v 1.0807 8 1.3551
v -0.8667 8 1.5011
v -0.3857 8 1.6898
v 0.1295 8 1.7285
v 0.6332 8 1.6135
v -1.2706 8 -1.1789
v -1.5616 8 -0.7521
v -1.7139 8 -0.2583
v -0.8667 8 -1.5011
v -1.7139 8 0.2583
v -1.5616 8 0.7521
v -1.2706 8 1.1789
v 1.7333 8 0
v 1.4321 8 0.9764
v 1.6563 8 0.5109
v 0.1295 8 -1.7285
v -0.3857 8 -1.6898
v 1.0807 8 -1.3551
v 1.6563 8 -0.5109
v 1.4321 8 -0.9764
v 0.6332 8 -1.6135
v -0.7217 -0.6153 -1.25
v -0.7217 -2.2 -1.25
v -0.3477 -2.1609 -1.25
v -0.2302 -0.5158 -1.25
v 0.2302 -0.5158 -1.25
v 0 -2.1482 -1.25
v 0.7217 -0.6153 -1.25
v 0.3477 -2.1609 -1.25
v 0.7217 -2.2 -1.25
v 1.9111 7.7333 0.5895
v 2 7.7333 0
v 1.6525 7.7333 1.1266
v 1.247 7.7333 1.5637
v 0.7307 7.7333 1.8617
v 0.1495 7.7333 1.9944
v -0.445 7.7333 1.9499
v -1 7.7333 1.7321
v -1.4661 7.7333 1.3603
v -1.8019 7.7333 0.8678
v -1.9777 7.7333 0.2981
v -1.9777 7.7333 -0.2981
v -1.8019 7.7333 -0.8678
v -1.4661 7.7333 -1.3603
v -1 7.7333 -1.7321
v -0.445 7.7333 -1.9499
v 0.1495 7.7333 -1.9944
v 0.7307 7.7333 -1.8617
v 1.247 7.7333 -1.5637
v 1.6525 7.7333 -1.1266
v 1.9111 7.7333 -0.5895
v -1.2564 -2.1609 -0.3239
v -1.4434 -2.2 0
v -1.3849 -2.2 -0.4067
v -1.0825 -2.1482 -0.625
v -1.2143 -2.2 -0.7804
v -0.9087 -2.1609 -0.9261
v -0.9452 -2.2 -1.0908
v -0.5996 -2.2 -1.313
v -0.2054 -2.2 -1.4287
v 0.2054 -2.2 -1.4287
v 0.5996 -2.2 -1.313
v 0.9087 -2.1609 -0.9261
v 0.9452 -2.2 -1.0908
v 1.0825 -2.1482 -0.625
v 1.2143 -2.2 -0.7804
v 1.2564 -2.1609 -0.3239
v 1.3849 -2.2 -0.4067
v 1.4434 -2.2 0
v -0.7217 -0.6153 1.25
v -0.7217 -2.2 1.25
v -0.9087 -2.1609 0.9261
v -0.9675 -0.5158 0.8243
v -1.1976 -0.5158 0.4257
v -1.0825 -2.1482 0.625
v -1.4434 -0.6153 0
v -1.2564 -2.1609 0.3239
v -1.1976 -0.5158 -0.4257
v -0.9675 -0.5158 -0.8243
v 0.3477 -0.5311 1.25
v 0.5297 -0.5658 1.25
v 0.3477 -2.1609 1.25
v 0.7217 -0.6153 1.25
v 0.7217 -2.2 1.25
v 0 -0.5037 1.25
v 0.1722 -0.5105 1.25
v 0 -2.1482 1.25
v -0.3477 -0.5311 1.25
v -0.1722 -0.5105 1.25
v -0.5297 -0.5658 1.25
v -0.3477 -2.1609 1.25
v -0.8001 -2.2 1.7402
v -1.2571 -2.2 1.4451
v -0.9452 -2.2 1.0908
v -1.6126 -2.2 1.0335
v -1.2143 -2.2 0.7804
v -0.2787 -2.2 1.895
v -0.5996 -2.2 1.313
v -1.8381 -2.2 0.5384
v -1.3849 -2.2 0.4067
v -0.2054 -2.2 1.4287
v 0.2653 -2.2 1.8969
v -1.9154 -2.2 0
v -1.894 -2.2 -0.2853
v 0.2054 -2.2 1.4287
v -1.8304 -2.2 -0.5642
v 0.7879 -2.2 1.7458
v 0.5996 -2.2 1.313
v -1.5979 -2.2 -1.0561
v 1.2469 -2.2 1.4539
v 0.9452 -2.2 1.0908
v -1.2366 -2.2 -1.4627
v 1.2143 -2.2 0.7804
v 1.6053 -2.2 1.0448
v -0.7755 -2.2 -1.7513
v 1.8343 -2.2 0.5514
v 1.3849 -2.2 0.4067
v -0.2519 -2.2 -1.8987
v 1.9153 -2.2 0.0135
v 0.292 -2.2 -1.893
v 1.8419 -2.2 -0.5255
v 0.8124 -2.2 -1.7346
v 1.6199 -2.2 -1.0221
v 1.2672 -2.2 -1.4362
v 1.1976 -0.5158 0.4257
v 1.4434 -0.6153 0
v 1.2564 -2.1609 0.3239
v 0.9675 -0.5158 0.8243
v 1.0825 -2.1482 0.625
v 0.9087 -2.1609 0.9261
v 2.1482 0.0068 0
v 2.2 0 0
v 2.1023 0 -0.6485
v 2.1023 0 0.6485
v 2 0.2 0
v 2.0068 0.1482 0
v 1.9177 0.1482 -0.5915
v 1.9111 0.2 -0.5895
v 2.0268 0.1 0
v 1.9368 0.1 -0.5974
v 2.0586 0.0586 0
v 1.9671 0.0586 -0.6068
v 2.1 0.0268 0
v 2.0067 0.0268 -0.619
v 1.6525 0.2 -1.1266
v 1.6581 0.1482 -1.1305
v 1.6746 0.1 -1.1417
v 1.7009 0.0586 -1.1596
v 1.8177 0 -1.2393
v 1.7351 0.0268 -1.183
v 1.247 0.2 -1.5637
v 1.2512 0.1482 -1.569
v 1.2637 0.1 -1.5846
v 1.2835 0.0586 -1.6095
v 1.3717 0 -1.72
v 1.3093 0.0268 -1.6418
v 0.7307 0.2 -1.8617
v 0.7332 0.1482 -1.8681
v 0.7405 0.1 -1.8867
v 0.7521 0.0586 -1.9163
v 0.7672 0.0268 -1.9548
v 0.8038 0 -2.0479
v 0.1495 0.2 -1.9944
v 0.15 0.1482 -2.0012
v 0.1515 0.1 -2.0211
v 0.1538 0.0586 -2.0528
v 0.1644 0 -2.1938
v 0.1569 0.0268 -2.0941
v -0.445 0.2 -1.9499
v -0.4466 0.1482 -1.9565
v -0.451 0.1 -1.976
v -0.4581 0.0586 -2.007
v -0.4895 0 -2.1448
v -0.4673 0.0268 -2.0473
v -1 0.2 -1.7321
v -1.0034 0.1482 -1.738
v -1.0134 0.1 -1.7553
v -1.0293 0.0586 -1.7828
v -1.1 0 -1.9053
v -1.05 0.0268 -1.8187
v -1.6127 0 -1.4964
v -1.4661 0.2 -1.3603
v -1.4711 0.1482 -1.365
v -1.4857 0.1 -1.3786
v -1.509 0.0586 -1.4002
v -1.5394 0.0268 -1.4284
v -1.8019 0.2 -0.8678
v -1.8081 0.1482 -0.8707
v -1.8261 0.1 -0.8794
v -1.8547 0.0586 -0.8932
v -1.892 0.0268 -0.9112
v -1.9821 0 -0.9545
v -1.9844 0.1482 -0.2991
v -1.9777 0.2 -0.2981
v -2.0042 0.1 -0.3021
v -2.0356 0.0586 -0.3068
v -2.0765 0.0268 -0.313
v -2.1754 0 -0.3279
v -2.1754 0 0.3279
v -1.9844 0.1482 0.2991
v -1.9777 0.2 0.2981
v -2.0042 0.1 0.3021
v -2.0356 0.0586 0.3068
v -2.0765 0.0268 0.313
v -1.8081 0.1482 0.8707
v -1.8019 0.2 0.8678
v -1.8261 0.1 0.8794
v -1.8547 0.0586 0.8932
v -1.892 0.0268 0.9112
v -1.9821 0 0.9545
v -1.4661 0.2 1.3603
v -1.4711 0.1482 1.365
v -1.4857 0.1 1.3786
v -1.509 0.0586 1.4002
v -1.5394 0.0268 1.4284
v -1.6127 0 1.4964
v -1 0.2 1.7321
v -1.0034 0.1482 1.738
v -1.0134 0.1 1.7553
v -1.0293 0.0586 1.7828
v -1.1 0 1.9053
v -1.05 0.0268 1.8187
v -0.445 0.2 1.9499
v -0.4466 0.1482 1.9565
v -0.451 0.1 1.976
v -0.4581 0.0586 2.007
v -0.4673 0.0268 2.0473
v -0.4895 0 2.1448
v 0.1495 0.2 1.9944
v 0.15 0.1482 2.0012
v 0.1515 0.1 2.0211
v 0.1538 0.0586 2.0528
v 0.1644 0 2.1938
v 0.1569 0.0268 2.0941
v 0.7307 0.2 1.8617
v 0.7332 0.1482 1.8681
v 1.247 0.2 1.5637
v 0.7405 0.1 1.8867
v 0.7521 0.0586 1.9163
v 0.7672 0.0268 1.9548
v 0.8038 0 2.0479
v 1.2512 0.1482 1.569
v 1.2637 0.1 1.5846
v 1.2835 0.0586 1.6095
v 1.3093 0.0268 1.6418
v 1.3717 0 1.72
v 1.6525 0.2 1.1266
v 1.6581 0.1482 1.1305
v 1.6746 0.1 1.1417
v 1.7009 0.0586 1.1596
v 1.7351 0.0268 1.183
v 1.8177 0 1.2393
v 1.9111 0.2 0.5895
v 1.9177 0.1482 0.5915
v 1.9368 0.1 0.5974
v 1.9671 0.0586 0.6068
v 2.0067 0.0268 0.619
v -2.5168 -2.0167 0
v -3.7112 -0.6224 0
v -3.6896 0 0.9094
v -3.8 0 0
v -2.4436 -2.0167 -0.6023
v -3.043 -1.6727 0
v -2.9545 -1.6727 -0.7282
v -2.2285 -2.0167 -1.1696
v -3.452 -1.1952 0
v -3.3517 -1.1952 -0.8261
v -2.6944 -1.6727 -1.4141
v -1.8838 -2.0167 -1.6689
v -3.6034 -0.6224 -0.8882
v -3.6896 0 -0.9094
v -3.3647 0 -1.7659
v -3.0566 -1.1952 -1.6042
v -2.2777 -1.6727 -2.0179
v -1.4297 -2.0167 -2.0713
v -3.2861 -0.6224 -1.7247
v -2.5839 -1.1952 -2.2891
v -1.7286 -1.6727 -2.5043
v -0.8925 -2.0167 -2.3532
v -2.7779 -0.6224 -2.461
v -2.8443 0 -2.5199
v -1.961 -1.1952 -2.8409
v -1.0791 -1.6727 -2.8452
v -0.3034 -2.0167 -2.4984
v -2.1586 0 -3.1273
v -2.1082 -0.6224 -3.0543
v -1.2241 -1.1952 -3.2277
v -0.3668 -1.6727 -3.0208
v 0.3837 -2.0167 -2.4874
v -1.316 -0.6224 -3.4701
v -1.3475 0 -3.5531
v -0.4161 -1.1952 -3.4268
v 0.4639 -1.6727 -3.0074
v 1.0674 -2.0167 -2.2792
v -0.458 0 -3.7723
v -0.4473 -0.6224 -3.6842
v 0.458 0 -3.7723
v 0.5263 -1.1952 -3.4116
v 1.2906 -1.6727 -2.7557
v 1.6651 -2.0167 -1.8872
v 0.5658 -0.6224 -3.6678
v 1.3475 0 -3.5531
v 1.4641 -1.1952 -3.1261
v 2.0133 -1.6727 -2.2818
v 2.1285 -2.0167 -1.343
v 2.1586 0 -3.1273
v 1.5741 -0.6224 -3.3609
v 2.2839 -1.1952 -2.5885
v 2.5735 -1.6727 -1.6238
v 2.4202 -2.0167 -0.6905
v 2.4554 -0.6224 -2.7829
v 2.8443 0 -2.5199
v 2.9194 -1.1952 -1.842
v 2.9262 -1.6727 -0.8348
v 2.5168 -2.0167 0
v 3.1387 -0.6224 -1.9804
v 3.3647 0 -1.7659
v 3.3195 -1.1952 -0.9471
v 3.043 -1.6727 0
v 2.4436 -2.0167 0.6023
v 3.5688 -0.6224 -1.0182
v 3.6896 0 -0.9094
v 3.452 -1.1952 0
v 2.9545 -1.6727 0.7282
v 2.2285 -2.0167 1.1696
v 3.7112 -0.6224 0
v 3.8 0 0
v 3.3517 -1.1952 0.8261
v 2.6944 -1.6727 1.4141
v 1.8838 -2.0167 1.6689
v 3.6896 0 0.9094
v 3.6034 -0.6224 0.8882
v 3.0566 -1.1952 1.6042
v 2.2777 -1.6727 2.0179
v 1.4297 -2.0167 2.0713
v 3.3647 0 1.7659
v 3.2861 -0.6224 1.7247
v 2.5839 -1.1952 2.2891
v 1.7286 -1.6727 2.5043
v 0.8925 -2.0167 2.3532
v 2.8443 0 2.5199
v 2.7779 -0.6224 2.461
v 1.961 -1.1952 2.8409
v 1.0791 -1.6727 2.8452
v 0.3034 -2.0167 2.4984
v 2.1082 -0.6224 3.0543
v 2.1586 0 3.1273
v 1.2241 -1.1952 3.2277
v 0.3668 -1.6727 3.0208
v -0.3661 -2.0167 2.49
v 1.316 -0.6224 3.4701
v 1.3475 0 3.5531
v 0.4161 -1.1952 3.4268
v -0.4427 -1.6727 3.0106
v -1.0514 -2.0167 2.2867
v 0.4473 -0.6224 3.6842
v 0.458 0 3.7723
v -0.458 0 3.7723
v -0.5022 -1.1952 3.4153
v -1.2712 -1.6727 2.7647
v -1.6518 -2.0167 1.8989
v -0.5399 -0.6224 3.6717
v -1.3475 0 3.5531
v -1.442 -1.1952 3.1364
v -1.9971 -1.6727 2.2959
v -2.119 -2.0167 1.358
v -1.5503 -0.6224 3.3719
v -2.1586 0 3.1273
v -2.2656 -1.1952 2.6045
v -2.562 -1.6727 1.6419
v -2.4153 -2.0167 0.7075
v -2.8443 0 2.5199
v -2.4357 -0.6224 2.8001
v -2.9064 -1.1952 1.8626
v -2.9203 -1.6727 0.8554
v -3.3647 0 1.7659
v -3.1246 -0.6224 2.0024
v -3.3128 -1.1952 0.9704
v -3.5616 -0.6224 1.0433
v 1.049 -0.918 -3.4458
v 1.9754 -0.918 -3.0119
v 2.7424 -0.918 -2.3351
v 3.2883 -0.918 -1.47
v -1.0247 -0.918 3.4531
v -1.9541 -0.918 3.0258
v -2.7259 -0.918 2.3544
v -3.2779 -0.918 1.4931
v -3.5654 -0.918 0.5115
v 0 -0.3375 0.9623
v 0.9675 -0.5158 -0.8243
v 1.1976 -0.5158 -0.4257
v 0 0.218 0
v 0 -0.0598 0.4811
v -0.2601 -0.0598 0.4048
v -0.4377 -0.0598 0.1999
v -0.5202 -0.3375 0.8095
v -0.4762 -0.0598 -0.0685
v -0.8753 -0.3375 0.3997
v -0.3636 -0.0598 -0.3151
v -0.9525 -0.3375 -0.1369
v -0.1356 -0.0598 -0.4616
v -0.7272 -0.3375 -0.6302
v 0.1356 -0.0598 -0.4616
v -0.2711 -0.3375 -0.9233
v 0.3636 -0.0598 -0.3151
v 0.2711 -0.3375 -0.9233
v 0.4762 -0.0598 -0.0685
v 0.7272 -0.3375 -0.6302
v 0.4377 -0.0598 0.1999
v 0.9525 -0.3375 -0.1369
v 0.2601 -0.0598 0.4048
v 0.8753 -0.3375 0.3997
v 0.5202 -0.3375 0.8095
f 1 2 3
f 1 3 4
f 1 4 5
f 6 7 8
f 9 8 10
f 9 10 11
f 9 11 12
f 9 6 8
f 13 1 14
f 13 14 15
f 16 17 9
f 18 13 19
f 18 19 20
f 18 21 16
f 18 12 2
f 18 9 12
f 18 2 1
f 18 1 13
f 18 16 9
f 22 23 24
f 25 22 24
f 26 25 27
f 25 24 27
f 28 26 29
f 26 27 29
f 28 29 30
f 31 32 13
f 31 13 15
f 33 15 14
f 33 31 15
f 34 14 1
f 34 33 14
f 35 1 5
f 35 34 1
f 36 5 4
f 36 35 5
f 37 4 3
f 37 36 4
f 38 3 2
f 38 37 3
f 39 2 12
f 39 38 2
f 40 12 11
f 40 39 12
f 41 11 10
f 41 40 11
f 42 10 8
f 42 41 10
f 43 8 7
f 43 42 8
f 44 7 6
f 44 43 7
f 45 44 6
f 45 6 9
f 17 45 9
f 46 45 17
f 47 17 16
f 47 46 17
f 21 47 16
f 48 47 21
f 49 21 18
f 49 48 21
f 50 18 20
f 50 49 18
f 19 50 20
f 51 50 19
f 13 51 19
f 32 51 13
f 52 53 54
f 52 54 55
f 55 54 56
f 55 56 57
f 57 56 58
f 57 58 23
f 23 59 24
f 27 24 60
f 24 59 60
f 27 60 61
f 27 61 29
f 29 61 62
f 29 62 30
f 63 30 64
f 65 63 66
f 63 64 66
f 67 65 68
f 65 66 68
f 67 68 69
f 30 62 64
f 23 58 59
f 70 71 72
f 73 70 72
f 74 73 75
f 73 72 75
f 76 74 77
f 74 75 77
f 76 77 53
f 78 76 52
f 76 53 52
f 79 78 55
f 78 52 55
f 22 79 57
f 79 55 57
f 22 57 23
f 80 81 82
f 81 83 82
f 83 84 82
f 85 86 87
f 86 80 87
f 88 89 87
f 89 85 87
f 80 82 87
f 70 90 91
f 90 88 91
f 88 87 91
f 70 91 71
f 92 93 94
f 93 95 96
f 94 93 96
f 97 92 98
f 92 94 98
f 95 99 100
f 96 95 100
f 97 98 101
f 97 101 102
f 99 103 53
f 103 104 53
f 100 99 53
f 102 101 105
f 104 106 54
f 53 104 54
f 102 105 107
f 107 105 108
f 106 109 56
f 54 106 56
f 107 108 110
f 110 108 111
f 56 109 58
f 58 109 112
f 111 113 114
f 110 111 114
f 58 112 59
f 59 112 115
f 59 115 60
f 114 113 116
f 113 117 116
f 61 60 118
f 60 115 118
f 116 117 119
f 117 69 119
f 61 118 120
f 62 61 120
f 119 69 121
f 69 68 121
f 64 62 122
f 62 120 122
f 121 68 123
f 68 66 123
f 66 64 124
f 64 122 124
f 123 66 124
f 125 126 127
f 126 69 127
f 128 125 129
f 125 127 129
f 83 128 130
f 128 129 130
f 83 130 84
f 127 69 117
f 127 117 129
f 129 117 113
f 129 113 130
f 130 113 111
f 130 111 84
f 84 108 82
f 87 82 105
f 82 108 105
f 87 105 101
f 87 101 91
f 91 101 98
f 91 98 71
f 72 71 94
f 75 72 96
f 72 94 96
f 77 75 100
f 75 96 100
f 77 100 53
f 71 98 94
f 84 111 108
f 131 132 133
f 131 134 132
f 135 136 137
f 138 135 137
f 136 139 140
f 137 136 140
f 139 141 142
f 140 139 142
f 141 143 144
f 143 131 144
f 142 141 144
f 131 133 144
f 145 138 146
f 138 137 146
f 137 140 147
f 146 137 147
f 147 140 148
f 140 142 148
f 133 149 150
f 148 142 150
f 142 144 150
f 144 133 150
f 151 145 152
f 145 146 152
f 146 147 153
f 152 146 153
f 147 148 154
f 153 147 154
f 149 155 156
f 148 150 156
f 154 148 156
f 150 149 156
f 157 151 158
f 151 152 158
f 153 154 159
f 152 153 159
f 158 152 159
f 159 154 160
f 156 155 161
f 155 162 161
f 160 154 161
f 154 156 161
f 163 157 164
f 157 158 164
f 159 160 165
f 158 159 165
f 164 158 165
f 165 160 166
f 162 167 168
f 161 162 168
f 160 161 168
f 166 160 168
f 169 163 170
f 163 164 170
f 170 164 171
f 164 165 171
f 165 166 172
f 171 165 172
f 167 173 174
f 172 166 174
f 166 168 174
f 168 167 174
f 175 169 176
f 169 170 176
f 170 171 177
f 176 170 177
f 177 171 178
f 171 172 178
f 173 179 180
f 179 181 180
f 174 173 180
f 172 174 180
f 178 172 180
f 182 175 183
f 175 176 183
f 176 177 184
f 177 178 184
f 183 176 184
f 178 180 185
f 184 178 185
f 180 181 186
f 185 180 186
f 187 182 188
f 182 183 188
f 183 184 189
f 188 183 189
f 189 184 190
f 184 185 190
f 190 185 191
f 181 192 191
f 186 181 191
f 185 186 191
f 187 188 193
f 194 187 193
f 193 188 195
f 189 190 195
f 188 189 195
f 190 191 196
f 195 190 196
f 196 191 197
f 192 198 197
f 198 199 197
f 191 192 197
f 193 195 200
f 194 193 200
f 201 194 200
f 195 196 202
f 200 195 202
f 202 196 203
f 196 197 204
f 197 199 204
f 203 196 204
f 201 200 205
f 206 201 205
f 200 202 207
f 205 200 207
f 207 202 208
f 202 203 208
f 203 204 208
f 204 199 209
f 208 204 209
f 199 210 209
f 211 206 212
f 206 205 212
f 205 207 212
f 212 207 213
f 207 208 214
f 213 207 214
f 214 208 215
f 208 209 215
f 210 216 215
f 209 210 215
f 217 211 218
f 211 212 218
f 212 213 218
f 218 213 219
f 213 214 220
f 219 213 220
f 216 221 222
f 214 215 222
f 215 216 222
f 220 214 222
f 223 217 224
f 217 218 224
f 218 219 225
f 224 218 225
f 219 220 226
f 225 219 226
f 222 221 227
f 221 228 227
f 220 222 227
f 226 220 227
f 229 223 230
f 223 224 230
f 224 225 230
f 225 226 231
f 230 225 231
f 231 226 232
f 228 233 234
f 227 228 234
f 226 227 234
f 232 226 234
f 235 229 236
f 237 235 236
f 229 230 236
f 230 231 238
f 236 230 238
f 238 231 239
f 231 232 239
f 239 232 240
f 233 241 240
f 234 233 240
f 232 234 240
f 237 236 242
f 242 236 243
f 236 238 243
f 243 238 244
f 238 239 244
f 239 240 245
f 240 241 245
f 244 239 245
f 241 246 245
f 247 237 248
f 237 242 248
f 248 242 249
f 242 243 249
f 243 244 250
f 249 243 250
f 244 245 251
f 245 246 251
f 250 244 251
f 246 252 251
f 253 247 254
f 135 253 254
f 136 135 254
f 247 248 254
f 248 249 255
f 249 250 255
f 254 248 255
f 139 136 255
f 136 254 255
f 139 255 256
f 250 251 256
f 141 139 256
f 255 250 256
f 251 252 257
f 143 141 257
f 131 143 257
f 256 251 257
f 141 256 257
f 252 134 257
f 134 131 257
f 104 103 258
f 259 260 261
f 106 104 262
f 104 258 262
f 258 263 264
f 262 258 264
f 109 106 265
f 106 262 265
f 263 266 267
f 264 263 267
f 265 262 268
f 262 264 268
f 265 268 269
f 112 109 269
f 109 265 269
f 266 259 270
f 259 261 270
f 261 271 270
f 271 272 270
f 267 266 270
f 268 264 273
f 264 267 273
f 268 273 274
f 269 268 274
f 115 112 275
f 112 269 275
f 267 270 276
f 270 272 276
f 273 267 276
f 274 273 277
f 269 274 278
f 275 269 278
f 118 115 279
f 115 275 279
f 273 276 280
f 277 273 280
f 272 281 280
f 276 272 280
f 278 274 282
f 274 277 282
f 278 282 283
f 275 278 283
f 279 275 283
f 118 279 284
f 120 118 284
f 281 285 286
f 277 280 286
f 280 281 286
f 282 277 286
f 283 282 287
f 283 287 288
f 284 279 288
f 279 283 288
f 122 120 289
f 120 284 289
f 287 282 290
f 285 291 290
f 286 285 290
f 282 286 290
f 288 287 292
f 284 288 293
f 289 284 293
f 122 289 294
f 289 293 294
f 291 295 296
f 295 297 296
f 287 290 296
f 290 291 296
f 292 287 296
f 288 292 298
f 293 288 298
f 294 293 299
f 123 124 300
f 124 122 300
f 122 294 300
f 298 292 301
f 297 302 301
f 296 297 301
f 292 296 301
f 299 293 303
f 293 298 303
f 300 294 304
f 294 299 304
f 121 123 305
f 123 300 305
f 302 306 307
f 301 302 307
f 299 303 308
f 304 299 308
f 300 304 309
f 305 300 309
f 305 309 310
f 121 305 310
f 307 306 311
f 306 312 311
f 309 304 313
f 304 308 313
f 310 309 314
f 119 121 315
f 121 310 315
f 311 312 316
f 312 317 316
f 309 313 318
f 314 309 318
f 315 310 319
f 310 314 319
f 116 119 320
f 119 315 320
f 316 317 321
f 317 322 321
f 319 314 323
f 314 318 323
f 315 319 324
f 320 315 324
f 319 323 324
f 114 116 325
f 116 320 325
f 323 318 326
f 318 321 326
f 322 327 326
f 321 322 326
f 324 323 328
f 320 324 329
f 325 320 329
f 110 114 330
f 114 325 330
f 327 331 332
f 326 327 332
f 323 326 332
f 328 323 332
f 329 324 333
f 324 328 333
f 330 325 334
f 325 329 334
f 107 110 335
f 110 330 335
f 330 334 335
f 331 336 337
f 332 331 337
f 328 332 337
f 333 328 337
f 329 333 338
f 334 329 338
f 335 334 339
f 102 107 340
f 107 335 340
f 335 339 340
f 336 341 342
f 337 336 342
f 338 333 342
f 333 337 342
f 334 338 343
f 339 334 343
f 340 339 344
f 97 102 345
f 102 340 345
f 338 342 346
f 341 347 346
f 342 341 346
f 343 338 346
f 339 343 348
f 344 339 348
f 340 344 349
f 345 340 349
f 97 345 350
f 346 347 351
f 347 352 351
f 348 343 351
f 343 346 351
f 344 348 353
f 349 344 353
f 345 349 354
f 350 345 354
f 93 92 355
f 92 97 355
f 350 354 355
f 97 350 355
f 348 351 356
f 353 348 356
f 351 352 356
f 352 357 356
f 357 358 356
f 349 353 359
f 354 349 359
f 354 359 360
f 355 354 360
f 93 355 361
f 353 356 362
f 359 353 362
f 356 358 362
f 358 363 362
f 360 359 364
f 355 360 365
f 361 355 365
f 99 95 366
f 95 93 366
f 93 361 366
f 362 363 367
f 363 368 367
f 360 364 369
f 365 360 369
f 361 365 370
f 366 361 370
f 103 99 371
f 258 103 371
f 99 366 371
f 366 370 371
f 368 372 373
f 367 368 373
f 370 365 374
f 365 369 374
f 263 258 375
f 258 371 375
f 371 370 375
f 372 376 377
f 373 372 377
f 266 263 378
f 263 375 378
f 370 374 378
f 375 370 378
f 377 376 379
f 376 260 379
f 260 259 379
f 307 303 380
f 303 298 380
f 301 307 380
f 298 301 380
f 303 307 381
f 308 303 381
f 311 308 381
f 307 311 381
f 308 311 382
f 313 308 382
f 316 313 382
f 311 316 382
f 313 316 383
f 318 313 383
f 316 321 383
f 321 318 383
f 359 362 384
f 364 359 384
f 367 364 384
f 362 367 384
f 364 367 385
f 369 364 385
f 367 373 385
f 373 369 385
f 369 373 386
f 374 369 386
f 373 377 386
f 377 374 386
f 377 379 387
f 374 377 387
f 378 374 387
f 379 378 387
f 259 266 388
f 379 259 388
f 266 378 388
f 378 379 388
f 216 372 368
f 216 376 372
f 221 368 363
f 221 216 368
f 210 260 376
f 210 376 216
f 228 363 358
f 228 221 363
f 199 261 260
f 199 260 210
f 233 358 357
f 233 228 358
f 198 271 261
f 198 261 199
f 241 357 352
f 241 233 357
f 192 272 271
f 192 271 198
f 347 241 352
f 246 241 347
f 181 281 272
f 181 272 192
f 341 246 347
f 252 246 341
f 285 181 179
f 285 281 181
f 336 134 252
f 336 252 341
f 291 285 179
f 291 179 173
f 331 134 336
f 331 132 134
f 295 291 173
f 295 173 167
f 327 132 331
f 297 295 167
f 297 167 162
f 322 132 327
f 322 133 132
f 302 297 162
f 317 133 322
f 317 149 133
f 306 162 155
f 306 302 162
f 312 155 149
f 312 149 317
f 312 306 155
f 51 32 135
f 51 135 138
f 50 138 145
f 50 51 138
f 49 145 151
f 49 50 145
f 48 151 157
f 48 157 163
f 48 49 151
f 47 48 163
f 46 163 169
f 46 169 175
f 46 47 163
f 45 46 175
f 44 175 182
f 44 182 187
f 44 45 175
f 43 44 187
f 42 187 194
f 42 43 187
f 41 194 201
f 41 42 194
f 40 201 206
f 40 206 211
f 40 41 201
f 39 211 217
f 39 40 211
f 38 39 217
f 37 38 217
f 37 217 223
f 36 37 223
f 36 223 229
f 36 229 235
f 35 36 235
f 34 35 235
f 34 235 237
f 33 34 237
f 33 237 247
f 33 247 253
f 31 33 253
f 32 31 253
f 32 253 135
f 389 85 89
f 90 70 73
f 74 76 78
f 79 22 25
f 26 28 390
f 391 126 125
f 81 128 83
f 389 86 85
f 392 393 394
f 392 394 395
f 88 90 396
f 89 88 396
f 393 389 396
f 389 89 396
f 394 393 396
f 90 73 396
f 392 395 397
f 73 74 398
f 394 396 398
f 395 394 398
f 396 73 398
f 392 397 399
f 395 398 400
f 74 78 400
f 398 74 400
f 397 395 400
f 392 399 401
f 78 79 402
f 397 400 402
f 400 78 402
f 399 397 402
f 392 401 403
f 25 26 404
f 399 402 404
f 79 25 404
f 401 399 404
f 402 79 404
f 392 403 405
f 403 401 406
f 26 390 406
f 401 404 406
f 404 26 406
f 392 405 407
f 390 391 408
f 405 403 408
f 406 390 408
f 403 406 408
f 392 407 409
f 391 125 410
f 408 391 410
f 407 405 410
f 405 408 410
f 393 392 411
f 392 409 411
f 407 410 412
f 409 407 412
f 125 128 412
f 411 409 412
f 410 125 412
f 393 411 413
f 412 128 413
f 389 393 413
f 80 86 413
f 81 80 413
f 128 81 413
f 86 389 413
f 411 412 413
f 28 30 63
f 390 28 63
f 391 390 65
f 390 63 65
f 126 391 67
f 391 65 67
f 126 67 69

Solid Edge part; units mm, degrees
sketch "Sketch1" plane through (0, 0, 0) normal (0, 0, 1) x (1, 0, 0)
  line L0 (2, 0) -> (2, 8)
  line L1 (0, 8) -> (2, 8)
  line L2 (0, 0) -> (0, 8)
  line L3 (0, 0) -> (0, -2.2)
  line L4 (0, -2.2) -> (3.8, -2.2)
  line L5 (3.8, -2.2) -> (3.8, 0)
  line L6 (3.8, 0) -> (2, 0)
revolve "RevolvedProtrusion1" add sketch "Sketch1" angle 360 about axis through (0, 0, 0) along (0, 1, 0)
sketch "Sketch2" plane through (0, 0, 0) normal (1, 0, 0) x (0, 1, 0)
  line L0 (-2.2, 1.9365) -> (-0.9, 1.9365)
  line L1 (0.218, 0) -> (-0.9, 1.9365)
  line L2 (-2.2, 0) -> (0.218, 0)
  line L3 (-2.2, 0) -> (-2.2, 1.9365)
revolve "RevolvedCutout1" cut sketch "Sketch2" angle 360 about axis through (0, -4.5, 0) along (0, 1, 0)
sketch "Sketch3" plane through (0, -2.2, 0) normal (0, -1, 0) x (0, 0, 1)
  circle A0 centre (0, 0) radius 1.9365
  line L0 (-1.25, -0.7217) -> (0, -1.4434)
  line L1 (0, -1.4434) -> (1.25, -0.7217)
  line L2 (1.25, -0.7217) -> (1.25, 0.7217)
  line L3 (1.25, 0.7217) -> (0, 1.4434)
  line L4 (0, 1.4434) -> (-1.25, 0.7217)
  line L5 (-1.25, 0.7217) -> (-1.25, -0.7217)
  dimension "D1" = 2.5
extrude "Protrusion1" add sketch "Sketch3" against normal up to next
sketch "Sketch4" plane through (0, 0, 0) normal (0, 0, 1) x (1, 0, 0)
  line L0 (-1.4434, -2.2) -> (0, -2.2)
  line L1 (0, -2.2) -> (0, -1.8132)
  line L2 (0, -1.8132) -> (-1.4434, -2.2)
revolve "RevolvedCutout2" cut sketch "Sketch4" angle 360 about axis through (0, -4.5, 0) along (0, 1, 0)
fillet "Round1" radius 0.2 1 edges at (0, 0, -2)
chamfer "倒斜角_2" distance 0.2667 angle 45 1 edges at (0, 8, -2)
cosmetic_thread "螺纹_3" size "M4" thread depth 6.6
sketch "Sketch5" plane through (0, 0, 0) normal (0, 0, 1) x (1, 0, 0)
  arc A0 (-1.9153, -2.2) -> (-3.8, 0) centre (-1.5736, 0) cw
revolve "RevolvedCutout3" cut sketch "Sketch5" angle 360 about axis through (0, 0, 0) along (0, -1, 0) material side at (-3.3024, -1.481, 0)
